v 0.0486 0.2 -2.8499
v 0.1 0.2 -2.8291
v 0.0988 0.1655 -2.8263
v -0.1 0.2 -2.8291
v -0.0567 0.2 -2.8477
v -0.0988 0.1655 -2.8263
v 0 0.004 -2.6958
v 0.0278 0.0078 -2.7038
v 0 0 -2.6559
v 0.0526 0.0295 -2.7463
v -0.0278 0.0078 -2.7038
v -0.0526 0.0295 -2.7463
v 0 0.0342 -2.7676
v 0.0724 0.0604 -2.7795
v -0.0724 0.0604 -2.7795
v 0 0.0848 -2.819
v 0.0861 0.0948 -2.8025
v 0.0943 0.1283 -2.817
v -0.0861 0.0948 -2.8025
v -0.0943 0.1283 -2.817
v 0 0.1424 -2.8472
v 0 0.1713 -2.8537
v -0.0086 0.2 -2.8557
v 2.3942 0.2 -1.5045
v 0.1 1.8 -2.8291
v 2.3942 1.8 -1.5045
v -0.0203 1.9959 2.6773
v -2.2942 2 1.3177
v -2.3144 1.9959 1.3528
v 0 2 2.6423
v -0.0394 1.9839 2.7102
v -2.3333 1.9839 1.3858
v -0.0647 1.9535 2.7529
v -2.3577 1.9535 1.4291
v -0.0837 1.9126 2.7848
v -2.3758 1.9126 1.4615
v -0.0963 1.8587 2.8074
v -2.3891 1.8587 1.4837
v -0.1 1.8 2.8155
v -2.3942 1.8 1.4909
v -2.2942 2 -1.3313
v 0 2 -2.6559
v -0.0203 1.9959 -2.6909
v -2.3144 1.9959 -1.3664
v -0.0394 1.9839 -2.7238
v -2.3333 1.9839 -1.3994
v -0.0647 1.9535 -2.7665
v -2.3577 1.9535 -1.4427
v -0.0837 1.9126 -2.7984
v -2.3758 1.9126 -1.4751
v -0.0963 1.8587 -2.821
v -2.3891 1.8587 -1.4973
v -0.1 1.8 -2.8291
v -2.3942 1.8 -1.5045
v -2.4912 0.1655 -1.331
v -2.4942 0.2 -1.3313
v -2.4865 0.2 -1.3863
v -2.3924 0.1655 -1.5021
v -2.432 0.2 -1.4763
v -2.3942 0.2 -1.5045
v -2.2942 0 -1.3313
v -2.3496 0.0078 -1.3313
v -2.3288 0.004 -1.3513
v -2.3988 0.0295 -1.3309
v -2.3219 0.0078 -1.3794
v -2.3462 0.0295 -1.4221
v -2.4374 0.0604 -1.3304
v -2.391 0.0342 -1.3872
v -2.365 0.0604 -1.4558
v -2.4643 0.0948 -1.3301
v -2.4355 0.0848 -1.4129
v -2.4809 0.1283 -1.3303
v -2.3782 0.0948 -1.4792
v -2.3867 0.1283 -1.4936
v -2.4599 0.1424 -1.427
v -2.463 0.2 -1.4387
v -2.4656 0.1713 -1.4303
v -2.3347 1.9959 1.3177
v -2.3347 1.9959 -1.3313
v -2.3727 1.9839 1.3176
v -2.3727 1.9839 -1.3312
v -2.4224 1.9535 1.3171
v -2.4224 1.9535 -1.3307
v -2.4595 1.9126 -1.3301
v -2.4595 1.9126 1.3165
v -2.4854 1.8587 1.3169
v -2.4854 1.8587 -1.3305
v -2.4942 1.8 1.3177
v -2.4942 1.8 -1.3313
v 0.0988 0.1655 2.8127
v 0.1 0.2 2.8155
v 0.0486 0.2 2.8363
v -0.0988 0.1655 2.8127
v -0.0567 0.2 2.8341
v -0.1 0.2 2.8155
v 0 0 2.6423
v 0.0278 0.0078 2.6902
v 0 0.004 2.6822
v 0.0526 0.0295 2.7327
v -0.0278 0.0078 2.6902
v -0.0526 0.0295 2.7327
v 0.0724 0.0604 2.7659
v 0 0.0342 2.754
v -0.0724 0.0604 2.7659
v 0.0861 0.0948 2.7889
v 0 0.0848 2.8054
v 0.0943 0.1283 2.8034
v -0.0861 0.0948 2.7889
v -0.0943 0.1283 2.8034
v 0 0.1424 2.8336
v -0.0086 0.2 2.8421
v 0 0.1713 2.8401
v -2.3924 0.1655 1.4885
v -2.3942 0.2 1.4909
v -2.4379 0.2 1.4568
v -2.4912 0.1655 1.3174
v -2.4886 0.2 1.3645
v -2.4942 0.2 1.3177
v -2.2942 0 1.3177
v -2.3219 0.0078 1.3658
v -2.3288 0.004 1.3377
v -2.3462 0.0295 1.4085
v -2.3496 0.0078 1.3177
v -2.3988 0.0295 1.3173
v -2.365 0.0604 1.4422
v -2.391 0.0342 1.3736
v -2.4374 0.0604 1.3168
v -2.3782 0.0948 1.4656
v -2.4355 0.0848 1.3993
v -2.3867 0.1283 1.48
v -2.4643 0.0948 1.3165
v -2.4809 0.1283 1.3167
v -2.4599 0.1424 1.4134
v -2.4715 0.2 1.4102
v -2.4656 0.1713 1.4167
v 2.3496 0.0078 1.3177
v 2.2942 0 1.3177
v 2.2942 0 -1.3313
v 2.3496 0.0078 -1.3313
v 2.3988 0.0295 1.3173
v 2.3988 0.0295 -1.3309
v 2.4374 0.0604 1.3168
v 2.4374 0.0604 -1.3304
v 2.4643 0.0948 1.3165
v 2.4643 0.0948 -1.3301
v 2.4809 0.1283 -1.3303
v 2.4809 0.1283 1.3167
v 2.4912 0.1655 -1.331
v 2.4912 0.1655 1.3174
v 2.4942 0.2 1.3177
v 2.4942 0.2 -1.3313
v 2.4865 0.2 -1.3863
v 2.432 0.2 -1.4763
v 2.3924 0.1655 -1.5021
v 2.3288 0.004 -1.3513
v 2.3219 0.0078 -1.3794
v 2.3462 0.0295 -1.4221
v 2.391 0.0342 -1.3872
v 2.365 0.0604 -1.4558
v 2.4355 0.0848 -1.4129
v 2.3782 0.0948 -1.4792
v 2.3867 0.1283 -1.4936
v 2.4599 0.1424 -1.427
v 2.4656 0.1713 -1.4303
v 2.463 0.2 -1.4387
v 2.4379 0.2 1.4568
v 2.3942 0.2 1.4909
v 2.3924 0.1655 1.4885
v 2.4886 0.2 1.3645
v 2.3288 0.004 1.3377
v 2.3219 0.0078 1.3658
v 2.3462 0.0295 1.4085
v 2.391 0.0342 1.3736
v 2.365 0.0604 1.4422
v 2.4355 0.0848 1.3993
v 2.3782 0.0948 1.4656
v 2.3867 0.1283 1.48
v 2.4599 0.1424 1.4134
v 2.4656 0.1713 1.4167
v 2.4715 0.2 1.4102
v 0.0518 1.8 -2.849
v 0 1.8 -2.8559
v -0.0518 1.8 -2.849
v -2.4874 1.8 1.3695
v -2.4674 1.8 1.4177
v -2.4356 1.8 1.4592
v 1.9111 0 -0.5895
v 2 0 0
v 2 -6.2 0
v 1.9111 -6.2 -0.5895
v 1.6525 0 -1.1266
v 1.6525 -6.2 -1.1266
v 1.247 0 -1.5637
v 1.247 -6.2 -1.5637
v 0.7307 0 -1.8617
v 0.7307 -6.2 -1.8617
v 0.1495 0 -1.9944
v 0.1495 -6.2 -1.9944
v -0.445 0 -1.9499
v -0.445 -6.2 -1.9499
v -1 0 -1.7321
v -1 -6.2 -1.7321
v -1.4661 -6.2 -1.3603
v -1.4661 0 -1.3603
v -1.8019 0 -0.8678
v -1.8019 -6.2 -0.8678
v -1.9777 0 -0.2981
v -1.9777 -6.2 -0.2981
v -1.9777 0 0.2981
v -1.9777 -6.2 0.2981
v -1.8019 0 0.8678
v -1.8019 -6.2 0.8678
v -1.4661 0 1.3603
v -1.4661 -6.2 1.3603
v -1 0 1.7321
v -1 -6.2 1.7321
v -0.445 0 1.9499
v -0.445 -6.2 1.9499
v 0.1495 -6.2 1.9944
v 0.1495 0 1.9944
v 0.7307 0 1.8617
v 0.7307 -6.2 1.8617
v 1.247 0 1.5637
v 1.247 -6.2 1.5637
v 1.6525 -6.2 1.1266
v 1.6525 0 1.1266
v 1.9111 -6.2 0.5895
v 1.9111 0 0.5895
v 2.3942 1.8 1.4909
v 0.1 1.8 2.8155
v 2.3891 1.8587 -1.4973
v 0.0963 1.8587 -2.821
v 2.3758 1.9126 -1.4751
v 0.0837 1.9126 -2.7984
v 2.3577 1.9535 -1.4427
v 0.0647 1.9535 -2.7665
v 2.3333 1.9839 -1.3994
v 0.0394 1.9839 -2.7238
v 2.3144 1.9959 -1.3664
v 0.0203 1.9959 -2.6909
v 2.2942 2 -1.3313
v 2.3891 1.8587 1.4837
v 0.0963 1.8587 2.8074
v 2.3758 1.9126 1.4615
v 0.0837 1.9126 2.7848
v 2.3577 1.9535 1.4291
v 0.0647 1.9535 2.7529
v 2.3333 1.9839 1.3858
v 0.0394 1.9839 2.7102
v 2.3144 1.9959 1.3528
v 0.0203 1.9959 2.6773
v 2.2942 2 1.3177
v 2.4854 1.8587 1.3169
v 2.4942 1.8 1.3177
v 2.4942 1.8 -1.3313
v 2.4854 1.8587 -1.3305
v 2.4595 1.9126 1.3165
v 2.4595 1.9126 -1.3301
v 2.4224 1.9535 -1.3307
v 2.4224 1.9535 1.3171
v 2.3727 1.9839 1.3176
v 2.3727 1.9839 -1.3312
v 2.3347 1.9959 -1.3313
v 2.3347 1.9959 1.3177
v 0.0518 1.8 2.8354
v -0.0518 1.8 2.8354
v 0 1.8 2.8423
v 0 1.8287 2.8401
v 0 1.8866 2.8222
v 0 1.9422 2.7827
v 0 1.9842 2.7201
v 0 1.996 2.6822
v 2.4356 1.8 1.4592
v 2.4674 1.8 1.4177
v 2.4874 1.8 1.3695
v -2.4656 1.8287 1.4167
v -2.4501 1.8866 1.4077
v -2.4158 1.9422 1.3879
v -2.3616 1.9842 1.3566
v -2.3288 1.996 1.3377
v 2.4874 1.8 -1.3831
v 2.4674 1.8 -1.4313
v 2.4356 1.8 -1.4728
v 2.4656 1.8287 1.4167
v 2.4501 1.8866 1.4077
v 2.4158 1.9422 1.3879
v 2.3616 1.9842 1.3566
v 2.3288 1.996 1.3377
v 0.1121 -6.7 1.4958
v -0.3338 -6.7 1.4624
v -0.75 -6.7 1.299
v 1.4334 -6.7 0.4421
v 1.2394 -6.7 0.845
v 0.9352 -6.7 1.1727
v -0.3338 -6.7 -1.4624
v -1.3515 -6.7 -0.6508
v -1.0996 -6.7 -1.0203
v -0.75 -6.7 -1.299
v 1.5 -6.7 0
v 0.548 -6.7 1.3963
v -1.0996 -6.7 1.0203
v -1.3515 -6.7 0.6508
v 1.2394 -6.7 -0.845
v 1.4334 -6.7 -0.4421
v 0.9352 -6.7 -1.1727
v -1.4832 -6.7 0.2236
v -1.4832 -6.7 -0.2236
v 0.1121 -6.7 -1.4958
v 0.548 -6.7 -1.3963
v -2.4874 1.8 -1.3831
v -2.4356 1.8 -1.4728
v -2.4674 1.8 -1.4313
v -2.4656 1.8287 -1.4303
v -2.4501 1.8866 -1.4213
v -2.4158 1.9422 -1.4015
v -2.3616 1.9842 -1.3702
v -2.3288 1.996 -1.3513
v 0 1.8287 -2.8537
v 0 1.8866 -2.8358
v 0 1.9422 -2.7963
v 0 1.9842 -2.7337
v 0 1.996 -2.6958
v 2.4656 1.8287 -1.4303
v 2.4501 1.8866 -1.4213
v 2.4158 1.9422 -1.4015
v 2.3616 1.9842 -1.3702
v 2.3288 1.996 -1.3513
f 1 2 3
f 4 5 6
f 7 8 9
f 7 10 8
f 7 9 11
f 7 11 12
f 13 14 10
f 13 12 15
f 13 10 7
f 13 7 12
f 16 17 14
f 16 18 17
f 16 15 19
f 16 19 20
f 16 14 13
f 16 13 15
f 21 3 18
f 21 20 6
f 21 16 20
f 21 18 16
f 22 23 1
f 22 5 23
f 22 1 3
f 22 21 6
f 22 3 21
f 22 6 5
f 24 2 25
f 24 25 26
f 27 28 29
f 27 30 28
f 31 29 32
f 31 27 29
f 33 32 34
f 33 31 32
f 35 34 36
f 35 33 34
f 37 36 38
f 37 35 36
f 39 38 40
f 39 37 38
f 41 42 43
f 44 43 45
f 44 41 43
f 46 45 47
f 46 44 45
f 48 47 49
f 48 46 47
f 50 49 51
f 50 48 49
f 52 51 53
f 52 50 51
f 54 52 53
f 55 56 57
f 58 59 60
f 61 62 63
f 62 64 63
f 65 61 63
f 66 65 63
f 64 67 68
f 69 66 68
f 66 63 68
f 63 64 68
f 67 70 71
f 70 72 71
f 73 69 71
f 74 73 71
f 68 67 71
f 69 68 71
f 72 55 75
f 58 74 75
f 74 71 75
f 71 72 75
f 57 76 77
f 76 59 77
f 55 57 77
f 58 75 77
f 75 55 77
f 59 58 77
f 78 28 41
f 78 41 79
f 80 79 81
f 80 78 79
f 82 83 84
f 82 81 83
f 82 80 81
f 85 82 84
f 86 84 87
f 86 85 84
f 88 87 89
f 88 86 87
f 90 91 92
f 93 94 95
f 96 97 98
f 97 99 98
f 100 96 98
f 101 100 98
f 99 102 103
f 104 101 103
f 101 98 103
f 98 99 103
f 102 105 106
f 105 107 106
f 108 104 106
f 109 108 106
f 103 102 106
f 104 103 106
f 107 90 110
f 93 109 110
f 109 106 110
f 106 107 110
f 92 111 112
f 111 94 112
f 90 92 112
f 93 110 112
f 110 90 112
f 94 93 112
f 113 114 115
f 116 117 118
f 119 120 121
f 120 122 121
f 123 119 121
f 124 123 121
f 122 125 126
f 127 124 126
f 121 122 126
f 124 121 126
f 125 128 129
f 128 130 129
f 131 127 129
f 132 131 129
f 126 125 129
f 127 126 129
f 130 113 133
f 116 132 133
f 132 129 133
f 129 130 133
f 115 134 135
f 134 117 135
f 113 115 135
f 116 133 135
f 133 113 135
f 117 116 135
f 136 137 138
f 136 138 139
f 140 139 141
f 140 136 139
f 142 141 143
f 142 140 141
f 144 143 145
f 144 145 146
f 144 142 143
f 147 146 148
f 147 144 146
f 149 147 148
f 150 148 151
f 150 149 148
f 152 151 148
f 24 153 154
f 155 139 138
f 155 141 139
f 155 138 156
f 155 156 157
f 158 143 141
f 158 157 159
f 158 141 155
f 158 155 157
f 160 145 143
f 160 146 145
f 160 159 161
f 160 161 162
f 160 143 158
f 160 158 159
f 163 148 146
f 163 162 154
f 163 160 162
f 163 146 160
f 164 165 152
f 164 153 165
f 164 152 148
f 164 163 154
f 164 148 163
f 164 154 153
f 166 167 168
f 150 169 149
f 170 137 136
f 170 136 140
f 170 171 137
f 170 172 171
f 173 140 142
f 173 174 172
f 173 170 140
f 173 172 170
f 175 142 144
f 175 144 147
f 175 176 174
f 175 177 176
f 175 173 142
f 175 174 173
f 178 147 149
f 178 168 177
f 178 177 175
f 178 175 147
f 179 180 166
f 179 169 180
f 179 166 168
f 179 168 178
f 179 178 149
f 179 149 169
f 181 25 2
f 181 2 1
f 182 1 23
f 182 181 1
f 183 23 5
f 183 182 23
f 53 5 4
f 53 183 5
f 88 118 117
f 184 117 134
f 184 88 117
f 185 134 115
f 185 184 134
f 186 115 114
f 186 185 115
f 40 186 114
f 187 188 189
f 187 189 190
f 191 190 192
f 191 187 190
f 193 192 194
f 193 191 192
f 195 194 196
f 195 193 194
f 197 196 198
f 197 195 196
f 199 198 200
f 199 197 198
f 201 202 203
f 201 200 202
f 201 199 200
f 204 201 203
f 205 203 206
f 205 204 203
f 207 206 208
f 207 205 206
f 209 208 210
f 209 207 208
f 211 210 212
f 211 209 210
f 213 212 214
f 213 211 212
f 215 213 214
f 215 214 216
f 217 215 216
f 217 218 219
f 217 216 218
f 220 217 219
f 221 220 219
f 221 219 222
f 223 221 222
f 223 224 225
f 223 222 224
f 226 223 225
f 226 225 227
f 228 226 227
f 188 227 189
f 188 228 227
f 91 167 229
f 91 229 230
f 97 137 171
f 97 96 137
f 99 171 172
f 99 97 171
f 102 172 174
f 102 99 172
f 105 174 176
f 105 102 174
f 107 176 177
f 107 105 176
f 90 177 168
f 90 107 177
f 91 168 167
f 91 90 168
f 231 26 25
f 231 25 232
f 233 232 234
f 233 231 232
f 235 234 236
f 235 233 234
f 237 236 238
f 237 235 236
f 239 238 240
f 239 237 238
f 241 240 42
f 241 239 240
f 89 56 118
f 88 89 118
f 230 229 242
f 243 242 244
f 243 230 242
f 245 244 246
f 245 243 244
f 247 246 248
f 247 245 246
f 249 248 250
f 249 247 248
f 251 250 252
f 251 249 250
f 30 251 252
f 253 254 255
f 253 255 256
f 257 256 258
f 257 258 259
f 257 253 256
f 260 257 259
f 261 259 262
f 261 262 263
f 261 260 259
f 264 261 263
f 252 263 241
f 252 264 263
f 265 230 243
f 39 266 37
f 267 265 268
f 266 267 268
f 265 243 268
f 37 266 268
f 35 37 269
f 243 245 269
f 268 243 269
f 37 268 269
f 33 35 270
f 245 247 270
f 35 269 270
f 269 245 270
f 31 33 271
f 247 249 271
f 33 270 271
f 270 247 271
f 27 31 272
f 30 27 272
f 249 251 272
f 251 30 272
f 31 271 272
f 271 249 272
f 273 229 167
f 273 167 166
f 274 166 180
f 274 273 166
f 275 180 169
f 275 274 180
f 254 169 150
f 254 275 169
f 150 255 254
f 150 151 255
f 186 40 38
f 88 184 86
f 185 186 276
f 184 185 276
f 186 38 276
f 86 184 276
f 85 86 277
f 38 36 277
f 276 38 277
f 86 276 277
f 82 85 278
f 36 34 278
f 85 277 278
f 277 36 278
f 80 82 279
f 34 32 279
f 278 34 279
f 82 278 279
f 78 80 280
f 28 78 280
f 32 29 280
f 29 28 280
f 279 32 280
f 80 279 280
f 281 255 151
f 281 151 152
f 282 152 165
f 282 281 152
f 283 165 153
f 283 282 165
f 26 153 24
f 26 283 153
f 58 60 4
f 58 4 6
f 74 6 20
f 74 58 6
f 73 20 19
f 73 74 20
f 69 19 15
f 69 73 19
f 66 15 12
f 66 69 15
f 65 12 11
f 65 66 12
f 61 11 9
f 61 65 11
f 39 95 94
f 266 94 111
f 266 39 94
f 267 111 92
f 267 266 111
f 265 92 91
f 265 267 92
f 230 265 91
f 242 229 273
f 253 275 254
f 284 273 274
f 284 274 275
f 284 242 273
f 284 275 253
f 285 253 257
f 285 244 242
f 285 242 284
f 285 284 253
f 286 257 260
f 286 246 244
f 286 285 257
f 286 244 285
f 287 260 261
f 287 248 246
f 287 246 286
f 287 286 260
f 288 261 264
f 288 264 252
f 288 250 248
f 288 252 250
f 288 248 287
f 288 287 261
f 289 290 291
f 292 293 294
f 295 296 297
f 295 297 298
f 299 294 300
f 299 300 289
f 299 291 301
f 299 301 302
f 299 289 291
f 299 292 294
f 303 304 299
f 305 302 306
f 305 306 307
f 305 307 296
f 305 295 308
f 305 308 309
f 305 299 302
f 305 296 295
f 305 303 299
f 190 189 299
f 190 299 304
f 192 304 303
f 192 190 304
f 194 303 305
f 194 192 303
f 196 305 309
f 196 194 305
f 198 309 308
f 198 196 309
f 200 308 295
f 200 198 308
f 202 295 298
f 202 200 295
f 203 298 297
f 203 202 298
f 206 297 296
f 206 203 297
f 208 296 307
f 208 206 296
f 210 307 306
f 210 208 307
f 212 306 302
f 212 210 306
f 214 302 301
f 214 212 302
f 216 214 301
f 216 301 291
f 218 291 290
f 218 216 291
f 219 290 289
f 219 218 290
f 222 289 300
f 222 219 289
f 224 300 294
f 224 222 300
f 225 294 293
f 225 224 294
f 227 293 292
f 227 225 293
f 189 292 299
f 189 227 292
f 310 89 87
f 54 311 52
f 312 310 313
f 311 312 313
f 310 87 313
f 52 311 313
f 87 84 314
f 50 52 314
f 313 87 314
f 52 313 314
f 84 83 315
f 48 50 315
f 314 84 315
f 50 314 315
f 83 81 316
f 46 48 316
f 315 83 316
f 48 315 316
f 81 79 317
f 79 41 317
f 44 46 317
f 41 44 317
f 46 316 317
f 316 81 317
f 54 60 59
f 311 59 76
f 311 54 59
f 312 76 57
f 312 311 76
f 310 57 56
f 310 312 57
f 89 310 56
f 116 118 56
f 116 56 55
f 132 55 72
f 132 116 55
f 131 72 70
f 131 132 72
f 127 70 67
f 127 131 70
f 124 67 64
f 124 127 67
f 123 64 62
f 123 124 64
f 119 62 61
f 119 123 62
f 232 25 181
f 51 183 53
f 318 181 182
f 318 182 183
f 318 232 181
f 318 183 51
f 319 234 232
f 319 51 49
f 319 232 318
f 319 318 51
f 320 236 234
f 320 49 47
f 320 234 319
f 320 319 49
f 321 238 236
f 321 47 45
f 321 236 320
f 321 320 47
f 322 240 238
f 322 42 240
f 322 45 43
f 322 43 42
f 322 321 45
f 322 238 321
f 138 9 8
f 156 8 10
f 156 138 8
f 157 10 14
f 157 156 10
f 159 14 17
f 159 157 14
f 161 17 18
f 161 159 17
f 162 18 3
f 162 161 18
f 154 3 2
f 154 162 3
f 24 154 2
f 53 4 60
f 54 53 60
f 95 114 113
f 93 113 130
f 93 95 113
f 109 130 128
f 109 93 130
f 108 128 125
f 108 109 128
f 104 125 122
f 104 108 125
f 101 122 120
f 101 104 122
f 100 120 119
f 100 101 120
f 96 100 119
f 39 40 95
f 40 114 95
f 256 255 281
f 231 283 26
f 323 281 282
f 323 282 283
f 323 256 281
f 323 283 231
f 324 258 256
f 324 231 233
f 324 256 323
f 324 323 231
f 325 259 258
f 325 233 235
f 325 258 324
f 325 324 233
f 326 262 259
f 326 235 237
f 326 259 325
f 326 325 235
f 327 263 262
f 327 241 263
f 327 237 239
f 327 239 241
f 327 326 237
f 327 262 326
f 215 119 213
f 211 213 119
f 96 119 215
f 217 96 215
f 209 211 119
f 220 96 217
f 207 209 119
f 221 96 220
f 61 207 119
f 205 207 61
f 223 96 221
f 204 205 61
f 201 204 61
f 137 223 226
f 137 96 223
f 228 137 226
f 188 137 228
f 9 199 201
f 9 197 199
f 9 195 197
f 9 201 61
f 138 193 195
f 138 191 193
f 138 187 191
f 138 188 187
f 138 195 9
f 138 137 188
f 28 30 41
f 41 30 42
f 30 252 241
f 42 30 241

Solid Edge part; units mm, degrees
sketch "Sketch1" plane through (0, 0, 0) normal (0, -1, 0) x (1, 0, 0)
  circle A0 centre (0, 0) radius 2
extrude "Protrusion1" add sketch "Sketch1" along normal blind 6.7
sketch "Sketch2" plane through (0, 0, 0) normal (0, 1, 0) x (1, 0, 0)
  line L0 (2.4942, -1.4332) -> (0, -2.8732)
  line L1 (-2.4942, -1.4332) -> (0, -2.8732)
  line L2 (-2.4942, 1.4468) -> (-2.4942, -1.4332)
  line L3 (0, 2.8868) -> (-2.4942, 1.4468)
  line L4 (0, 2.8868) -> (2.4942, 1.4468)
  line L5 (2.4942, 1.4468) -> (2.4942, -1.4332)
extrude "ExtrudedProtrusion_2" add sketch "Sketch2" along normal blind 2
fillet "Round_1" radius 0.2 12 edges at (1.2471, 0, 2.1532) (-1.2471, 0, 2.1532) (2.4942, 0, -0.0068) (1.2471, 0, -2.1668) (-1.2471, 0, -2.1668) (-2.4942, 0, -0.0068) (1.2471, 2, 2.1532) (-1.2471, 2, 2.1532) (-2.4942, 2, -0.0068) (-1.2471, 2, -2.1668) (1.2471, 2, -2.1668) (2.4942, 2, -0.0068)
fillet "Round_2" radius 0.2 18 edges at (0, 1, 2.8732) (0, 0.0586, 2.8056) (0, 1.9414, 2.8056) (2.4942, 1, 1.4332) (2.4356, 0.0586, 1.3994) (2.4356, 1.9414, 1.3994) (2.4942, 1, -1.4468) (2.4356, 0.0586, -1.4129) (2.4356, 1.9414, -1.4129) (-2.4942, 1, 1.4332) (-2.4356, 0.0586, 1.3994) (-2.4356, 1.9414, 1.3994) (0, 1, -2.8868) (0, 0.0586, -2.8191) (0, 1.9414, -2.8191) (-2.4942, 1, -1.4468) (-2.4356, 0.0586, -1.4129) (-2.4356, 1.9414, -1.4129)
chamfer "Chamfer_1" distance 0.5 angle 45 1 edges at (-2, -6.7, 0)
properties material "PVC"
